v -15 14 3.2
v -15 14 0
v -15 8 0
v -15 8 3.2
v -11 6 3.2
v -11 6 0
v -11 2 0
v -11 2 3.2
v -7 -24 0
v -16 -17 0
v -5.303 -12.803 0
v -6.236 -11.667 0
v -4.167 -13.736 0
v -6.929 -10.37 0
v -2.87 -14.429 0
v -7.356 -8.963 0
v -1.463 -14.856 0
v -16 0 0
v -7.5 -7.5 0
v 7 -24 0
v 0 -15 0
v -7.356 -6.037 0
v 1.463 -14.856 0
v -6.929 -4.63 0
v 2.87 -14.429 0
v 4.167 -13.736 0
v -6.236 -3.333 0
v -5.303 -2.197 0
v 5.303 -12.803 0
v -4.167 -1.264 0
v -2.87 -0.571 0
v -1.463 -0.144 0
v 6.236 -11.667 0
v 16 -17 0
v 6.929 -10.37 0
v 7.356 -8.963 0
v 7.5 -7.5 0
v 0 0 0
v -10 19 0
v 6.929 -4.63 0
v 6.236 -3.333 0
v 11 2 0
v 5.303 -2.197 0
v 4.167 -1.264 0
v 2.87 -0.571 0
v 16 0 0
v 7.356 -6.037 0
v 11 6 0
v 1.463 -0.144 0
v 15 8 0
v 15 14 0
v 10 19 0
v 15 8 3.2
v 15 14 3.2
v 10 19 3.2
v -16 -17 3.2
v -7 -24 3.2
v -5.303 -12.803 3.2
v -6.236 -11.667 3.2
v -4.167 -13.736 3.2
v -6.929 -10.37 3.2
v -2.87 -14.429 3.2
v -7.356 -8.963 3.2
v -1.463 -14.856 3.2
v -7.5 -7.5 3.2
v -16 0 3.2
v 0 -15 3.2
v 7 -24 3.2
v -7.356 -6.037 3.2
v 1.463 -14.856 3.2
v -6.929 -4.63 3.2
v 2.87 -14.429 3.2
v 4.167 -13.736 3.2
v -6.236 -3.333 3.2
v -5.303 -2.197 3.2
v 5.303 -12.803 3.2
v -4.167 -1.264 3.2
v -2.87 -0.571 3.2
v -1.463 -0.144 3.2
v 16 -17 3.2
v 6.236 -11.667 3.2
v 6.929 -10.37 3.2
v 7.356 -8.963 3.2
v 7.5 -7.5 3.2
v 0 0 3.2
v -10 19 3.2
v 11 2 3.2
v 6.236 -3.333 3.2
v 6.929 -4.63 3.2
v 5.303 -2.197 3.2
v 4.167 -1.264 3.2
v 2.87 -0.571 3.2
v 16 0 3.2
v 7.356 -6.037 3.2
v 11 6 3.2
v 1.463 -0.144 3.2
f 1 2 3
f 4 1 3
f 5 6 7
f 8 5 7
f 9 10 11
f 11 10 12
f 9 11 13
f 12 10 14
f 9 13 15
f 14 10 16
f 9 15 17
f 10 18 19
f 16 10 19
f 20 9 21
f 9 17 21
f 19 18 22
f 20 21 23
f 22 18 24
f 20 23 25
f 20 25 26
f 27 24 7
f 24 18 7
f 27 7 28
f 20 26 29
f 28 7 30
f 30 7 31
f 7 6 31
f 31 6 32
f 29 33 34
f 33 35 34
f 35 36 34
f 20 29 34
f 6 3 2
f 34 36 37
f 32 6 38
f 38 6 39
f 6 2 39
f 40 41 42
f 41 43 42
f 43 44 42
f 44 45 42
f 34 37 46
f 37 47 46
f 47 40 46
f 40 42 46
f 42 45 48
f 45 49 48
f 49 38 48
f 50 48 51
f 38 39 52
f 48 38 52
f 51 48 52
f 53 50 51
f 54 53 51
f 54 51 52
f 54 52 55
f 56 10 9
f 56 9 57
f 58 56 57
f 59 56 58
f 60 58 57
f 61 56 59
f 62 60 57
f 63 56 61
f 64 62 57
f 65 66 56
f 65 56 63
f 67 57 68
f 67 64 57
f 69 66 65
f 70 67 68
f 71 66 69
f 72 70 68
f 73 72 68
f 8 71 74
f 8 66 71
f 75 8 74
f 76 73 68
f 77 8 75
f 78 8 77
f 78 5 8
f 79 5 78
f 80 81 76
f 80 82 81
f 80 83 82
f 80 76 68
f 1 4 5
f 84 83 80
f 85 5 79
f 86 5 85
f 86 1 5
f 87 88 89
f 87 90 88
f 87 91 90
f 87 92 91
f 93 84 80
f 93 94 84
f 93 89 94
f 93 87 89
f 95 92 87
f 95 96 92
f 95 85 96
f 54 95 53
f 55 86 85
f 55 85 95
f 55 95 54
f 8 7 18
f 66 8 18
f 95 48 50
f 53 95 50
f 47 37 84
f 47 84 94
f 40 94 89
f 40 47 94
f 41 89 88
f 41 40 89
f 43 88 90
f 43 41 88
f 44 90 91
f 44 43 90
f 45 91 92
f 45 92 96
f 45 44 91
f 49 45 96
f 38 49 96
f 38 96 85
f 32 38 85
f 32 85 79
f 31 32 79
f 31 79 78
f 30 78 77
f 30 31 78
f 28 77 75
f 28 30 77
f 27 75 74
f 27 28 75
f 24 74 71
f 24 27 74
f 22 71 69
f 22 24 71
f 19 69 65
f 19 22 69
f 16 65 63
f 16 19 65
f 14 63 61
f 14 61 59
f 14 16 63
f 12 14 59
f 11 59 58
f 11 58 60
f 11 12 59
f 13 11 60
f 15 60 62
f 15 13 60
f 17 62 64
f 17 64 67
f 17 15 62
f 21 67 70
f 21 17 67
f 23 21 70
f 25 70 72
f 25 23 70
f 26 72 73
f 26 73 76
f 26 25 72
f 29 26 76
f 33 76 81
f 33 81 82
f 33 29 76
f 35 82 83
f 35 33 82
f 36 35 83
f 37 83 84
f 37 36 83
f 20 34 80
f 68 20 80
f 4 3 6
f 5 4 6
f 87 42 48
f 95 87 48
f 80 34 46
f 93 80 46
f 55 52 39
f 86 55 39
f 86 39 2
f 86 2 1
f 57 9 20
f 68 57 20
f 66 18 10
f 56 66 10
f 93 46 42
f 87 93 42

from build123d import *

# Parameters (mm, degrees)
F0_R     = 7.5
F1_DEPTH = 3.2
F2_SIZE2 = 7
F2_SIZE  = 9
F3_SIZE  = 5


with BuildPart() as f1:
    # F0 (on Top) → F1 (new body)
    with BuildSketch(Plane.XY):
        Polygon((-16, 0), (-16, -24), (16, -24), (16, 0), (11, 2), (11, 6), (15, 8), (15, 19), (-15, 19), (-15, 8), (-11, 6), (-11, 2), align=None)
        with Locations((0, -7.5)):
            Circle(F0_R, mode=Mode.SUBTRACT)
    extrude(amount=F1_DEPTH)

    # F2
    f2_edges = [f1.edges().sort_by_distance(p)[0] for p in [
        (-16, -24, 1.6),
        (16, -24, 1.6),
    ]]
    f2_side = f1.faces().sort_by_distance((0, -24, 1.6))[0]
    chamfer(f2_edges, length=F2_SIZE, length2=F2_SIZE2, reference=f2_side)

    # F3
    f3_edges = [f1.edges().sort_by_distance(p)[0] for p in [
        (-15, 19, 1.6),
        (15, 19, 1.6),
    ]]
    chamfer(f3_edges, length=F3_SIZE)


solid = f1.part
